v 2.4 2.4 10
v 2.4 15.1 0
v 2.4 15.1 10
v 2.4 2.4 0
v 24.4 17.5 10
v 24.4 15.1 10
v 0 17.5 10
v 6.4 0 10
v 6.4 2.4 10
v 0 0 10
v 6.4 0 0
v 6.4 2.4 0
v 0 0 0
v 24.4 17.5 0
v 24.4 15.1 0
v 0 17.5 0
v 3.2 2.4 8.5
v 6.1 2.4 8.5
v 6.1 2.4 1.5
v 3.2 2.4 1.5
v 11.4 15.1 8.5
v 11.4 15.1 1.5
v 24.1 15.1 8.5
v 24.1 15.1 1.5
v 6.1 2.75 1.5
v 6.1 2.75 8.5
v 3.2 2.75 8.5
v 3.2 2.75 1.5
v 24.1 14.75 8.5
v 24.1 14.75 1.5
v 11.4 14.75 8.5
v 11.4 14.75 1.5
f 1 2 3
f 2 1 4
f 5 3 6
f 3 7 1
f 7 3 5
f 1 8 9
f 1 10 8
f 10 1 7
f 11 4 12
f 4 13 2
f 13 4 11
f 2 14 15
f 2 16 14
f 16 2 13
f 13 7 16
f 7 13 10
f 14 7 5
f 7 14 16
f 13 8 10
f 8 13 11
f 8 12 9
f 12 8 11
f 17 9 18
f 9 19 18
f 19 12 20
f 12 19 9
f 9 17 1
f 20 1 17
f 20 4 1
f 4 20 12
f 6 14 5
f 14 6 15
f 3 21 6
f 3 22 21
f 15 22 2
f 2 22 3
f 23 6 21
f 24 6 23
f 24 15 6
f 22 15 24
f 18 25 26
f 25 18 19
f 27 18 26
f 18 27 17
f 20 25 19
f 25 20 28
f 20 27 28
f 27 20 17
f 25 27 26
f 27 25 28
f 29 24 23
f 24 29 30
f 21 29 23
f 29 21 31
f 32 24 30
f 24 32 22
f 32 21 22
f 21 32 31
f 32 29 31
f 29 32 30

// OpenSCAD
// One-piece LEFT edge-clip fit test for the populated electronics tray and
// vertical service stand. Print one, verify physically, then mirror in X for
// the right side only after fit is confirmed.

$fn = 32;

tray_t = 4;
upright_t = 8;
fit_clearance = 0.7;

clip_h = 10;
wall = 2.4;
inside_depth = tray_t + upright_t + fit_clearance;
outside_depth = inside_depth + 2 * wall;

// The closest PCB begins 6 mm inboard from the green tray edge. Limit the
// front jaw to 4 mm, leaving 2 mm nominal clearance. The upright begins 8 mm
// inboard, so a 22 mm rear jaw overlaps it by 14 mm.
front_grip = 4;
rear_grip = 22;
retention_rib = 0.35;

module left_edge_clip_fit_test() {
    union() {
        // Closed outer wall rests against the green tray edge.
        cube([wall, outside_depth, clip_h]);

        // Short front jaw stays inside the clear edge margin before the PCB.
        cube([wall + front_grip, wall, clip_h]);

        // Long rear jaw reaches the black upright behind the tray.
        translate([0, wall + inside_depth, 0])
            cube([wall + rear_grip, wall, clip_h]);

        // Shallow ribs give a slight PETG friction fit without relying on a
        // screw, adhesive or access behind the triangular brace.
        translate([wall + 0.8, wall - 0.1, 1.5])
            cube([front_grip - 1.1, retention_rib + 0.1, clip_h - 3]);
        translate([wall + 9, wall + inside_depth - retention_rib, 1.5])
            cube([rear_grip - 9.3, retention_rib + 0.1, clip_h - 3]);
    }
}

left_edge_clip_fit_test();
